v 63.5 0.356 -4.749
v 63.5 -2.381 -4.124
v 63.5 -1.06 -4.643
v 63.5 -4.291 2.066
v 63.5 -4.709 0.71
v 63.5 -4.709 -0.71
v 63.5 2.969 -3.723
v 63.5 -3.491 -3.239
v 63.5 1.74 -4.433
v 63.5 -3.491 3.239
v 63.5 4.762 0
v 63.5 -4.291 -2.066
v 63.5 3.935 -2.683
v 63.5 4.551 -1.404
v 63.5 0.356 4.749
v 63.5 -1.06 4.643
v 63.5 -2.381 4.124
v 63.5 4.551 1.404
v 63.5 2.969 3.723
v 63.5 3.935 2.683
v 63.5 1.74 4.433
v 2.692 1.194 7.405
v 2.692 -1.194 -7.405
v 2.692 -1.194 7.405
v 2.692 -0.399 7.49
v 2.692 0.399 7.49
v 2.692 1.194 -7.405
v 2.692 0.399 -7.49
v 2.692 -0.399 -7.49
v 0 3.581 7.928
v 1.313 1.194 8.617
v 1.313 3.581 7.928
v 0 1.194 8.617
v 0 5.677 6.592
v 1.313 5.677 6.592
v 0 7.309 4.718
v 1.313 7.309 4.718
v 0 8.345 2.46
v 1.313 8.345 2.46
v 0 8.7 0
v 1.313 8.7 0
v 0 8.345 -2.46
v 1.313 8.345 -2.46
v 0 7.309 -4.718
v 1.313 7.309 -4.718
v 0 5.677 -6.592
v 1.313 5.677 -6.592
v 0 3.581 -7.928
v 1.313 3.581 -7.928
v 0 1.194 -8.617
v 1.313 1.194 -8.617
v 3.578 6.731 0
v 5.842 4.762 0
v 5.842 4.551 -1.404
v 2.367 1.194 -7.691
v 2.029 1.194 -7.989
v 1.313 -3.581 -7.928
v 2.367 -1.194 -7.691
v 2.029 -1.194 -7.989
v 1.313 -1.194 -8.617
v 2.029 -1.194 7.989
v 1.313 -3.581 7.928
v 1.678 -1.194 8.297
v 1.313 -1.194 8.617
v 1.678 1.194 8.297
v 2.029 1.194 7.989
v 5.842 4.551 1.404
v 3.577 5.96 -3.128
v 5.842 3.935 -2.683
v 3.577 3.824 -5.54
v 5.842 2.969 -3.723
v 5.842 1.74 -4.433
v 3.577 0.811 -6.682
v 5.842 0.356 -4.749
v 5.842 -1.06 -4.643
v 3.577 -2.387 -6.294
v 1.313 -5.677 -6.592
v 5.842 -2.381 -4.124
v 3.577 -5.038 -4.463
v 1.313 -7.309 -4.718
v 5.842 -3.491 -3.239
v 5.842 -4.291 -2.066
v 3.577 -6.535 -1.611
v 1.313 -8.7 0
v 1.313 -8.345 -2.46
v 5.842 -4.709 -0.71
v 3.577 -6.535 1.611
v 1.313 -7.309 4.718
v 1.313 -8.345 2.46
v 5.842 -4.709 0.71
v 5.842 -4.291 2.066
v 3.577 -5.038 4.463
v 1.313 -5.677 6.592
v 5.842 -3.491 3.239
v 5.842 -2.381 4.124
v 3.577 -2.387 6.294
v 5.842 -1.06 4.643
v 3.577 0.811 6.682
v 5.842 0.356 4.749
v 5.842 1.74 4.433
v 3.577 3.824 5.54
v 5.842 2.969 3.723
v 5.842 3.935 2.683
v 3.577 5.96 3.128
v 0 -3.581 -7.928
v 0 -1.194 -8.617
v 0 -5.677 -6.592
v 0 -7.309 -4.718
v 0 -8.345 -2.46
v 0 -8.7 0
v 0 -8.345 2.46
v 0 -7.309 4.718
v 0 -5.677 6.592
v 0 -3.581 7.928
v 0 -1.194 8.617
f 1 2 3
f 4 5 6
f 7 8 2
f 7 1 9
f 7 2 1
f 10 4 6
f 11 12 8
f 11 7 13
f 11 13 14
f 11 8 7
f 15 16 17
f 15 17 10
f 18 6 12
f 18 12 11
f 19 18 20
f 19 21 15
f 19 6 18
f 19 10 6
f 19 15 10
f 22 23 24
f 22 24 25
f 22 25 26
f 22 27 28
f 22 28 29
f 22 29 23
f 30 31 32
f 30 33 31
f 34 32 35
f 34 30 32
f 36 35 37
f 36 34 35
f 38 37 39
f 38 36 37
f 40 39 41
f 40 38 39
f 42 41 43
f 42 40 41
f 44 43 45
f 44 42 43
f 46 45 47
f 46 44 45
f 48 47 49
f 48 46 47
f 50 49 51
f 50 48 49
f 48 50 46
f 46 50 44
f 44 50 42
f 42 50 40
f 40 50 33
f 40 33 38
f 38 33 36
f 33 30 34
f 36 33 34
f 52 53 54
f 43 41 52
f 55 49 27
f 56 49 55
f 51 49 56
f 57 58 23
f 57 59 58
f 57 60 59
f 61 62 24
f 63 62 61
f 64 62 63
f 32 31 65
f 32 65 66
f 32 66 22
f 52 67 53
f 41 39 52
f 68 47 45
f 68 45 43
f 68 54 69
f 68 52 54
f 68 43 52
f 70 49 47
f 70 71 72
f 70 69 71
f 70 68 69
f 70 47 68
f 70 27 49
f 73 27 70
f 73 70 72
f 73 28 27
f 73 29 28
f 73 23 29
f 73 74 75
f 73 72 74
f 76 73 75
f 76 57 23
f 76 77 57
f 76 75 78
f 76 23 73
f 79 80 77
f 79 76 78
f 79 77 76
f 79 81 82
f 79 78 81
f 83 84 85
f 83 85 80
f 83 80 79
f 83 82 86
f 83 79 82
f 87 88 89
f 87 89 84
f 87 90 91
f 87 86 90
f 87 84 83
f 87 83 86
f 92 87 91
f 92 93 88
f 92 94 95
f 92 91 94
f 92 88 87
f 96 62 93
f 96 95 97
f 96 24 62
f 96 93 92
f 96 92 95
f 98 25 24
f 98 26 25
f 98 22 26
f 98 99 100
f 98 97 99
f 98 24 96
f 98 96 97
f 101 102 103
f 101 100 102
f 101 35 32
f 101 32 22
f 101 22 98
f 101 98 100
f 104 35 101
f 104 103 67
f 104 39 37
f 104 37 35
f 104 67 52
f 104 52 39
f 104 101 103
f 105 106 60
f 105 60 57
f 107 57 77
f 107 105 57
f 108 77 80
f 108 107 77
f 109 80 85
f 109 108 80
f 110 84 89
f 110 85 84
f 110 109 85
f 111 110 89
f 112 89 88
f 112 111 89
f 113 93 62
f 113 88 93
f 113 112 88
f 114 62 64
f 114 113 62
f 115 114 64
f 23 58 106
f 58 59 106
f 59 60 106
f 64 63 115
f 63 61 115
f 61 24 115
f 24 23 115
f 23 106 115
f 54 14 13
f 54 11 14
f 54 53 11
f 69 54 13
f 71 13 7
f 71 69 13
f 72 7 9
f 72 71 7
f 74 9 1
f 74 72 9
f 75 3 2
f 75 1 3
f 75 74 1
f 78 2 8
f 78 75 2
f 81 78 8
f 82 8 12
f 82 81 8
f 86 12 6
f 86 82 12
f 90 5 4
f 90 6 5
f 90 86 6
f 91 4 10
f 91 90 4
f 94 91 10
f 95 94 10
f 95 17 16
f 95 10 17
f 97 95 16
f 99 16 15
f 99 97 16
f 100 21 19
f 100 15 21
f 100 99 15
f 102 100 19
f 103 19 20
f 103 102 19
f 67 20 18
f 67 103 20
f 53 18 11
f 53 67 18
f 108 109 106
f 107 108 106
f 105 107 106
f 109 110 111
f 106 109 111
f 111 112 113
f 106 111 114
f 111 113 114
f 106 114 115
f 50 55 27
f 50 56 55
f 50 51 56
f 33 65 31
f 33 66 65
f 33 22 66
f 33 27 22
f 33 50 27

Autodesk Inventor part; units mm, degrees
ref_plane "YZ Plane" through (0, 0, 0) normal (1, 0, 0) x (0, 1, 0)
ref_plane "XZ Plane" through (0, 0, 0) normal (0, 1, 0) x (-1, 0, 0)
sketch "Sketch1" plane through (0, 0, 0) normal (0, 0, 1) x (1, 0, 0)
  line L0 (-12.7, 0) -> (76.2, 0) projected
  line L1 (0, 0) -> (63.5, 0)
  line L2 (63.5, 0) -> (63.5, 4.7625)
  line L3 (63.5, 4.7625) -> (38.1, 4.7625)
  line L4 (38.1, 4.7625) -> (36.5125, 4.7625)
  line L5 (36.5125, 4.7625) -> (5.842, 4.7625)
  line L6 (5.842, 4.7625) -> (5.842, 4.7625)
  line L7 (5.842, 4.7625) -> (1.313, 8.6995)
  line L8 (1.313, 8.6995) -> (0, 8.6995)
  line L9 (0, 8.6995) -> (0, 0)
  line L10 (0, -1.7399) -> (0, 10.4394) projected
  line L11 (38.1, 4.7625) -> (5.842, 4.7625) construction
  dimension "d2" = 63.5
  dimension "d3" = 5.842
  dimension "d4" = 25.4
  dimension "d5" = 1.5875
  dimension "d6" = 9.525
  dimension "d7" = 9.525
  dimension "d8" = 9.525
  dimension "d9" = 17.399
  dimension "d10" = 41
revolve "Body" add sketch "Sketch1" angle 360 about axis through (0, 0, 0) along (1, 0, 0)
sketch "Sketch2" plane through (0, 0, 0) normal (-1, 0, 0) x (0, 0, 1)
  circle A0 centre (0, 0) radius 8.6995 projected
  line L0 (-12.1793, 0) -> (12.1793, 0) projected
  line L1 (-8.6995, 0) -> (-8.6995, 1.1938)
  line L2 (-8.6995, 1.1938) -> (8.6995, 1.1938)
  line L3 (8.6995, 0) -> (8.6995, 1.1938)
  line L4 (-8.6995, 0) -> (-8.6995, -1.1938)
  line L5 (-8.6995, -1.1938) -> (8.6995, -1.1938)
  line L6 (8.6995, 0) -> (8.6995, -1.1938)
  dimension "d15" = 2.3876
extrude "Slot" cut sketch "Sketch2" against normal blind 2.6924 contours L0 A0 L2 | L6 L5 A0 | A0 L5 L0 | A0 L2 L3 | L1 L2 A0 | A0 L5 L4
thread "Thread" size "3/8-16 UNC" class "2A" standard "ANSI Unified Screw Threads" length 25.4
ref_plane "Work Plane1" through (7.5584, 0, 0) normal (0, 0, -1) x (1, 0, 0)
equation "\"d2\" = NLG"
equation "\"d3\" = KOH"
equation "\"d4\" = GEL"
equation "\"d5\" = GAL"
equation "\"d6\" = GD"
equation "\"d7\" = BDM"
equation "\"d8\" = KOD1"
equation "\"d9\" = KOD"
equation "\"d10\" = 0.5 * SEWI"
equation "\"d15\" = SBR"
equation "\"d16\" = STI"
equation "\"d12\" = GEL"
equation "\"NND\" = 9.525"
equation "\"NLG\" = 63.5"
equation "\"GEL\" = 25.4"
equation "\"KOH\" = 5.842"
equation "\"KOD\" = 17.399"
equation "\"SBR\" = 2.3876"
equation "\"STI\" = 2.6924"
equation "\"GAL\" = 1.5875"
equation "\"SPD\" = 7.14375"
equation "\"GD\" = NND"
equation "\"KOD1\" = NND"
equation "\"BDM\" = NND"
equation "\"SEWI\" = 82deg"
equation "\"GUL\" = 0.0254"
equation "\"THREADDIA\" = 9.525"
equation "\"TOA\" = 30deg"
equation "\"GD1\" = SPD"
properties part number "ANSI B18.6.3 - 3/8-16 x 2 1/2, SFCHMSI(1)" material "Steel, Mild"
